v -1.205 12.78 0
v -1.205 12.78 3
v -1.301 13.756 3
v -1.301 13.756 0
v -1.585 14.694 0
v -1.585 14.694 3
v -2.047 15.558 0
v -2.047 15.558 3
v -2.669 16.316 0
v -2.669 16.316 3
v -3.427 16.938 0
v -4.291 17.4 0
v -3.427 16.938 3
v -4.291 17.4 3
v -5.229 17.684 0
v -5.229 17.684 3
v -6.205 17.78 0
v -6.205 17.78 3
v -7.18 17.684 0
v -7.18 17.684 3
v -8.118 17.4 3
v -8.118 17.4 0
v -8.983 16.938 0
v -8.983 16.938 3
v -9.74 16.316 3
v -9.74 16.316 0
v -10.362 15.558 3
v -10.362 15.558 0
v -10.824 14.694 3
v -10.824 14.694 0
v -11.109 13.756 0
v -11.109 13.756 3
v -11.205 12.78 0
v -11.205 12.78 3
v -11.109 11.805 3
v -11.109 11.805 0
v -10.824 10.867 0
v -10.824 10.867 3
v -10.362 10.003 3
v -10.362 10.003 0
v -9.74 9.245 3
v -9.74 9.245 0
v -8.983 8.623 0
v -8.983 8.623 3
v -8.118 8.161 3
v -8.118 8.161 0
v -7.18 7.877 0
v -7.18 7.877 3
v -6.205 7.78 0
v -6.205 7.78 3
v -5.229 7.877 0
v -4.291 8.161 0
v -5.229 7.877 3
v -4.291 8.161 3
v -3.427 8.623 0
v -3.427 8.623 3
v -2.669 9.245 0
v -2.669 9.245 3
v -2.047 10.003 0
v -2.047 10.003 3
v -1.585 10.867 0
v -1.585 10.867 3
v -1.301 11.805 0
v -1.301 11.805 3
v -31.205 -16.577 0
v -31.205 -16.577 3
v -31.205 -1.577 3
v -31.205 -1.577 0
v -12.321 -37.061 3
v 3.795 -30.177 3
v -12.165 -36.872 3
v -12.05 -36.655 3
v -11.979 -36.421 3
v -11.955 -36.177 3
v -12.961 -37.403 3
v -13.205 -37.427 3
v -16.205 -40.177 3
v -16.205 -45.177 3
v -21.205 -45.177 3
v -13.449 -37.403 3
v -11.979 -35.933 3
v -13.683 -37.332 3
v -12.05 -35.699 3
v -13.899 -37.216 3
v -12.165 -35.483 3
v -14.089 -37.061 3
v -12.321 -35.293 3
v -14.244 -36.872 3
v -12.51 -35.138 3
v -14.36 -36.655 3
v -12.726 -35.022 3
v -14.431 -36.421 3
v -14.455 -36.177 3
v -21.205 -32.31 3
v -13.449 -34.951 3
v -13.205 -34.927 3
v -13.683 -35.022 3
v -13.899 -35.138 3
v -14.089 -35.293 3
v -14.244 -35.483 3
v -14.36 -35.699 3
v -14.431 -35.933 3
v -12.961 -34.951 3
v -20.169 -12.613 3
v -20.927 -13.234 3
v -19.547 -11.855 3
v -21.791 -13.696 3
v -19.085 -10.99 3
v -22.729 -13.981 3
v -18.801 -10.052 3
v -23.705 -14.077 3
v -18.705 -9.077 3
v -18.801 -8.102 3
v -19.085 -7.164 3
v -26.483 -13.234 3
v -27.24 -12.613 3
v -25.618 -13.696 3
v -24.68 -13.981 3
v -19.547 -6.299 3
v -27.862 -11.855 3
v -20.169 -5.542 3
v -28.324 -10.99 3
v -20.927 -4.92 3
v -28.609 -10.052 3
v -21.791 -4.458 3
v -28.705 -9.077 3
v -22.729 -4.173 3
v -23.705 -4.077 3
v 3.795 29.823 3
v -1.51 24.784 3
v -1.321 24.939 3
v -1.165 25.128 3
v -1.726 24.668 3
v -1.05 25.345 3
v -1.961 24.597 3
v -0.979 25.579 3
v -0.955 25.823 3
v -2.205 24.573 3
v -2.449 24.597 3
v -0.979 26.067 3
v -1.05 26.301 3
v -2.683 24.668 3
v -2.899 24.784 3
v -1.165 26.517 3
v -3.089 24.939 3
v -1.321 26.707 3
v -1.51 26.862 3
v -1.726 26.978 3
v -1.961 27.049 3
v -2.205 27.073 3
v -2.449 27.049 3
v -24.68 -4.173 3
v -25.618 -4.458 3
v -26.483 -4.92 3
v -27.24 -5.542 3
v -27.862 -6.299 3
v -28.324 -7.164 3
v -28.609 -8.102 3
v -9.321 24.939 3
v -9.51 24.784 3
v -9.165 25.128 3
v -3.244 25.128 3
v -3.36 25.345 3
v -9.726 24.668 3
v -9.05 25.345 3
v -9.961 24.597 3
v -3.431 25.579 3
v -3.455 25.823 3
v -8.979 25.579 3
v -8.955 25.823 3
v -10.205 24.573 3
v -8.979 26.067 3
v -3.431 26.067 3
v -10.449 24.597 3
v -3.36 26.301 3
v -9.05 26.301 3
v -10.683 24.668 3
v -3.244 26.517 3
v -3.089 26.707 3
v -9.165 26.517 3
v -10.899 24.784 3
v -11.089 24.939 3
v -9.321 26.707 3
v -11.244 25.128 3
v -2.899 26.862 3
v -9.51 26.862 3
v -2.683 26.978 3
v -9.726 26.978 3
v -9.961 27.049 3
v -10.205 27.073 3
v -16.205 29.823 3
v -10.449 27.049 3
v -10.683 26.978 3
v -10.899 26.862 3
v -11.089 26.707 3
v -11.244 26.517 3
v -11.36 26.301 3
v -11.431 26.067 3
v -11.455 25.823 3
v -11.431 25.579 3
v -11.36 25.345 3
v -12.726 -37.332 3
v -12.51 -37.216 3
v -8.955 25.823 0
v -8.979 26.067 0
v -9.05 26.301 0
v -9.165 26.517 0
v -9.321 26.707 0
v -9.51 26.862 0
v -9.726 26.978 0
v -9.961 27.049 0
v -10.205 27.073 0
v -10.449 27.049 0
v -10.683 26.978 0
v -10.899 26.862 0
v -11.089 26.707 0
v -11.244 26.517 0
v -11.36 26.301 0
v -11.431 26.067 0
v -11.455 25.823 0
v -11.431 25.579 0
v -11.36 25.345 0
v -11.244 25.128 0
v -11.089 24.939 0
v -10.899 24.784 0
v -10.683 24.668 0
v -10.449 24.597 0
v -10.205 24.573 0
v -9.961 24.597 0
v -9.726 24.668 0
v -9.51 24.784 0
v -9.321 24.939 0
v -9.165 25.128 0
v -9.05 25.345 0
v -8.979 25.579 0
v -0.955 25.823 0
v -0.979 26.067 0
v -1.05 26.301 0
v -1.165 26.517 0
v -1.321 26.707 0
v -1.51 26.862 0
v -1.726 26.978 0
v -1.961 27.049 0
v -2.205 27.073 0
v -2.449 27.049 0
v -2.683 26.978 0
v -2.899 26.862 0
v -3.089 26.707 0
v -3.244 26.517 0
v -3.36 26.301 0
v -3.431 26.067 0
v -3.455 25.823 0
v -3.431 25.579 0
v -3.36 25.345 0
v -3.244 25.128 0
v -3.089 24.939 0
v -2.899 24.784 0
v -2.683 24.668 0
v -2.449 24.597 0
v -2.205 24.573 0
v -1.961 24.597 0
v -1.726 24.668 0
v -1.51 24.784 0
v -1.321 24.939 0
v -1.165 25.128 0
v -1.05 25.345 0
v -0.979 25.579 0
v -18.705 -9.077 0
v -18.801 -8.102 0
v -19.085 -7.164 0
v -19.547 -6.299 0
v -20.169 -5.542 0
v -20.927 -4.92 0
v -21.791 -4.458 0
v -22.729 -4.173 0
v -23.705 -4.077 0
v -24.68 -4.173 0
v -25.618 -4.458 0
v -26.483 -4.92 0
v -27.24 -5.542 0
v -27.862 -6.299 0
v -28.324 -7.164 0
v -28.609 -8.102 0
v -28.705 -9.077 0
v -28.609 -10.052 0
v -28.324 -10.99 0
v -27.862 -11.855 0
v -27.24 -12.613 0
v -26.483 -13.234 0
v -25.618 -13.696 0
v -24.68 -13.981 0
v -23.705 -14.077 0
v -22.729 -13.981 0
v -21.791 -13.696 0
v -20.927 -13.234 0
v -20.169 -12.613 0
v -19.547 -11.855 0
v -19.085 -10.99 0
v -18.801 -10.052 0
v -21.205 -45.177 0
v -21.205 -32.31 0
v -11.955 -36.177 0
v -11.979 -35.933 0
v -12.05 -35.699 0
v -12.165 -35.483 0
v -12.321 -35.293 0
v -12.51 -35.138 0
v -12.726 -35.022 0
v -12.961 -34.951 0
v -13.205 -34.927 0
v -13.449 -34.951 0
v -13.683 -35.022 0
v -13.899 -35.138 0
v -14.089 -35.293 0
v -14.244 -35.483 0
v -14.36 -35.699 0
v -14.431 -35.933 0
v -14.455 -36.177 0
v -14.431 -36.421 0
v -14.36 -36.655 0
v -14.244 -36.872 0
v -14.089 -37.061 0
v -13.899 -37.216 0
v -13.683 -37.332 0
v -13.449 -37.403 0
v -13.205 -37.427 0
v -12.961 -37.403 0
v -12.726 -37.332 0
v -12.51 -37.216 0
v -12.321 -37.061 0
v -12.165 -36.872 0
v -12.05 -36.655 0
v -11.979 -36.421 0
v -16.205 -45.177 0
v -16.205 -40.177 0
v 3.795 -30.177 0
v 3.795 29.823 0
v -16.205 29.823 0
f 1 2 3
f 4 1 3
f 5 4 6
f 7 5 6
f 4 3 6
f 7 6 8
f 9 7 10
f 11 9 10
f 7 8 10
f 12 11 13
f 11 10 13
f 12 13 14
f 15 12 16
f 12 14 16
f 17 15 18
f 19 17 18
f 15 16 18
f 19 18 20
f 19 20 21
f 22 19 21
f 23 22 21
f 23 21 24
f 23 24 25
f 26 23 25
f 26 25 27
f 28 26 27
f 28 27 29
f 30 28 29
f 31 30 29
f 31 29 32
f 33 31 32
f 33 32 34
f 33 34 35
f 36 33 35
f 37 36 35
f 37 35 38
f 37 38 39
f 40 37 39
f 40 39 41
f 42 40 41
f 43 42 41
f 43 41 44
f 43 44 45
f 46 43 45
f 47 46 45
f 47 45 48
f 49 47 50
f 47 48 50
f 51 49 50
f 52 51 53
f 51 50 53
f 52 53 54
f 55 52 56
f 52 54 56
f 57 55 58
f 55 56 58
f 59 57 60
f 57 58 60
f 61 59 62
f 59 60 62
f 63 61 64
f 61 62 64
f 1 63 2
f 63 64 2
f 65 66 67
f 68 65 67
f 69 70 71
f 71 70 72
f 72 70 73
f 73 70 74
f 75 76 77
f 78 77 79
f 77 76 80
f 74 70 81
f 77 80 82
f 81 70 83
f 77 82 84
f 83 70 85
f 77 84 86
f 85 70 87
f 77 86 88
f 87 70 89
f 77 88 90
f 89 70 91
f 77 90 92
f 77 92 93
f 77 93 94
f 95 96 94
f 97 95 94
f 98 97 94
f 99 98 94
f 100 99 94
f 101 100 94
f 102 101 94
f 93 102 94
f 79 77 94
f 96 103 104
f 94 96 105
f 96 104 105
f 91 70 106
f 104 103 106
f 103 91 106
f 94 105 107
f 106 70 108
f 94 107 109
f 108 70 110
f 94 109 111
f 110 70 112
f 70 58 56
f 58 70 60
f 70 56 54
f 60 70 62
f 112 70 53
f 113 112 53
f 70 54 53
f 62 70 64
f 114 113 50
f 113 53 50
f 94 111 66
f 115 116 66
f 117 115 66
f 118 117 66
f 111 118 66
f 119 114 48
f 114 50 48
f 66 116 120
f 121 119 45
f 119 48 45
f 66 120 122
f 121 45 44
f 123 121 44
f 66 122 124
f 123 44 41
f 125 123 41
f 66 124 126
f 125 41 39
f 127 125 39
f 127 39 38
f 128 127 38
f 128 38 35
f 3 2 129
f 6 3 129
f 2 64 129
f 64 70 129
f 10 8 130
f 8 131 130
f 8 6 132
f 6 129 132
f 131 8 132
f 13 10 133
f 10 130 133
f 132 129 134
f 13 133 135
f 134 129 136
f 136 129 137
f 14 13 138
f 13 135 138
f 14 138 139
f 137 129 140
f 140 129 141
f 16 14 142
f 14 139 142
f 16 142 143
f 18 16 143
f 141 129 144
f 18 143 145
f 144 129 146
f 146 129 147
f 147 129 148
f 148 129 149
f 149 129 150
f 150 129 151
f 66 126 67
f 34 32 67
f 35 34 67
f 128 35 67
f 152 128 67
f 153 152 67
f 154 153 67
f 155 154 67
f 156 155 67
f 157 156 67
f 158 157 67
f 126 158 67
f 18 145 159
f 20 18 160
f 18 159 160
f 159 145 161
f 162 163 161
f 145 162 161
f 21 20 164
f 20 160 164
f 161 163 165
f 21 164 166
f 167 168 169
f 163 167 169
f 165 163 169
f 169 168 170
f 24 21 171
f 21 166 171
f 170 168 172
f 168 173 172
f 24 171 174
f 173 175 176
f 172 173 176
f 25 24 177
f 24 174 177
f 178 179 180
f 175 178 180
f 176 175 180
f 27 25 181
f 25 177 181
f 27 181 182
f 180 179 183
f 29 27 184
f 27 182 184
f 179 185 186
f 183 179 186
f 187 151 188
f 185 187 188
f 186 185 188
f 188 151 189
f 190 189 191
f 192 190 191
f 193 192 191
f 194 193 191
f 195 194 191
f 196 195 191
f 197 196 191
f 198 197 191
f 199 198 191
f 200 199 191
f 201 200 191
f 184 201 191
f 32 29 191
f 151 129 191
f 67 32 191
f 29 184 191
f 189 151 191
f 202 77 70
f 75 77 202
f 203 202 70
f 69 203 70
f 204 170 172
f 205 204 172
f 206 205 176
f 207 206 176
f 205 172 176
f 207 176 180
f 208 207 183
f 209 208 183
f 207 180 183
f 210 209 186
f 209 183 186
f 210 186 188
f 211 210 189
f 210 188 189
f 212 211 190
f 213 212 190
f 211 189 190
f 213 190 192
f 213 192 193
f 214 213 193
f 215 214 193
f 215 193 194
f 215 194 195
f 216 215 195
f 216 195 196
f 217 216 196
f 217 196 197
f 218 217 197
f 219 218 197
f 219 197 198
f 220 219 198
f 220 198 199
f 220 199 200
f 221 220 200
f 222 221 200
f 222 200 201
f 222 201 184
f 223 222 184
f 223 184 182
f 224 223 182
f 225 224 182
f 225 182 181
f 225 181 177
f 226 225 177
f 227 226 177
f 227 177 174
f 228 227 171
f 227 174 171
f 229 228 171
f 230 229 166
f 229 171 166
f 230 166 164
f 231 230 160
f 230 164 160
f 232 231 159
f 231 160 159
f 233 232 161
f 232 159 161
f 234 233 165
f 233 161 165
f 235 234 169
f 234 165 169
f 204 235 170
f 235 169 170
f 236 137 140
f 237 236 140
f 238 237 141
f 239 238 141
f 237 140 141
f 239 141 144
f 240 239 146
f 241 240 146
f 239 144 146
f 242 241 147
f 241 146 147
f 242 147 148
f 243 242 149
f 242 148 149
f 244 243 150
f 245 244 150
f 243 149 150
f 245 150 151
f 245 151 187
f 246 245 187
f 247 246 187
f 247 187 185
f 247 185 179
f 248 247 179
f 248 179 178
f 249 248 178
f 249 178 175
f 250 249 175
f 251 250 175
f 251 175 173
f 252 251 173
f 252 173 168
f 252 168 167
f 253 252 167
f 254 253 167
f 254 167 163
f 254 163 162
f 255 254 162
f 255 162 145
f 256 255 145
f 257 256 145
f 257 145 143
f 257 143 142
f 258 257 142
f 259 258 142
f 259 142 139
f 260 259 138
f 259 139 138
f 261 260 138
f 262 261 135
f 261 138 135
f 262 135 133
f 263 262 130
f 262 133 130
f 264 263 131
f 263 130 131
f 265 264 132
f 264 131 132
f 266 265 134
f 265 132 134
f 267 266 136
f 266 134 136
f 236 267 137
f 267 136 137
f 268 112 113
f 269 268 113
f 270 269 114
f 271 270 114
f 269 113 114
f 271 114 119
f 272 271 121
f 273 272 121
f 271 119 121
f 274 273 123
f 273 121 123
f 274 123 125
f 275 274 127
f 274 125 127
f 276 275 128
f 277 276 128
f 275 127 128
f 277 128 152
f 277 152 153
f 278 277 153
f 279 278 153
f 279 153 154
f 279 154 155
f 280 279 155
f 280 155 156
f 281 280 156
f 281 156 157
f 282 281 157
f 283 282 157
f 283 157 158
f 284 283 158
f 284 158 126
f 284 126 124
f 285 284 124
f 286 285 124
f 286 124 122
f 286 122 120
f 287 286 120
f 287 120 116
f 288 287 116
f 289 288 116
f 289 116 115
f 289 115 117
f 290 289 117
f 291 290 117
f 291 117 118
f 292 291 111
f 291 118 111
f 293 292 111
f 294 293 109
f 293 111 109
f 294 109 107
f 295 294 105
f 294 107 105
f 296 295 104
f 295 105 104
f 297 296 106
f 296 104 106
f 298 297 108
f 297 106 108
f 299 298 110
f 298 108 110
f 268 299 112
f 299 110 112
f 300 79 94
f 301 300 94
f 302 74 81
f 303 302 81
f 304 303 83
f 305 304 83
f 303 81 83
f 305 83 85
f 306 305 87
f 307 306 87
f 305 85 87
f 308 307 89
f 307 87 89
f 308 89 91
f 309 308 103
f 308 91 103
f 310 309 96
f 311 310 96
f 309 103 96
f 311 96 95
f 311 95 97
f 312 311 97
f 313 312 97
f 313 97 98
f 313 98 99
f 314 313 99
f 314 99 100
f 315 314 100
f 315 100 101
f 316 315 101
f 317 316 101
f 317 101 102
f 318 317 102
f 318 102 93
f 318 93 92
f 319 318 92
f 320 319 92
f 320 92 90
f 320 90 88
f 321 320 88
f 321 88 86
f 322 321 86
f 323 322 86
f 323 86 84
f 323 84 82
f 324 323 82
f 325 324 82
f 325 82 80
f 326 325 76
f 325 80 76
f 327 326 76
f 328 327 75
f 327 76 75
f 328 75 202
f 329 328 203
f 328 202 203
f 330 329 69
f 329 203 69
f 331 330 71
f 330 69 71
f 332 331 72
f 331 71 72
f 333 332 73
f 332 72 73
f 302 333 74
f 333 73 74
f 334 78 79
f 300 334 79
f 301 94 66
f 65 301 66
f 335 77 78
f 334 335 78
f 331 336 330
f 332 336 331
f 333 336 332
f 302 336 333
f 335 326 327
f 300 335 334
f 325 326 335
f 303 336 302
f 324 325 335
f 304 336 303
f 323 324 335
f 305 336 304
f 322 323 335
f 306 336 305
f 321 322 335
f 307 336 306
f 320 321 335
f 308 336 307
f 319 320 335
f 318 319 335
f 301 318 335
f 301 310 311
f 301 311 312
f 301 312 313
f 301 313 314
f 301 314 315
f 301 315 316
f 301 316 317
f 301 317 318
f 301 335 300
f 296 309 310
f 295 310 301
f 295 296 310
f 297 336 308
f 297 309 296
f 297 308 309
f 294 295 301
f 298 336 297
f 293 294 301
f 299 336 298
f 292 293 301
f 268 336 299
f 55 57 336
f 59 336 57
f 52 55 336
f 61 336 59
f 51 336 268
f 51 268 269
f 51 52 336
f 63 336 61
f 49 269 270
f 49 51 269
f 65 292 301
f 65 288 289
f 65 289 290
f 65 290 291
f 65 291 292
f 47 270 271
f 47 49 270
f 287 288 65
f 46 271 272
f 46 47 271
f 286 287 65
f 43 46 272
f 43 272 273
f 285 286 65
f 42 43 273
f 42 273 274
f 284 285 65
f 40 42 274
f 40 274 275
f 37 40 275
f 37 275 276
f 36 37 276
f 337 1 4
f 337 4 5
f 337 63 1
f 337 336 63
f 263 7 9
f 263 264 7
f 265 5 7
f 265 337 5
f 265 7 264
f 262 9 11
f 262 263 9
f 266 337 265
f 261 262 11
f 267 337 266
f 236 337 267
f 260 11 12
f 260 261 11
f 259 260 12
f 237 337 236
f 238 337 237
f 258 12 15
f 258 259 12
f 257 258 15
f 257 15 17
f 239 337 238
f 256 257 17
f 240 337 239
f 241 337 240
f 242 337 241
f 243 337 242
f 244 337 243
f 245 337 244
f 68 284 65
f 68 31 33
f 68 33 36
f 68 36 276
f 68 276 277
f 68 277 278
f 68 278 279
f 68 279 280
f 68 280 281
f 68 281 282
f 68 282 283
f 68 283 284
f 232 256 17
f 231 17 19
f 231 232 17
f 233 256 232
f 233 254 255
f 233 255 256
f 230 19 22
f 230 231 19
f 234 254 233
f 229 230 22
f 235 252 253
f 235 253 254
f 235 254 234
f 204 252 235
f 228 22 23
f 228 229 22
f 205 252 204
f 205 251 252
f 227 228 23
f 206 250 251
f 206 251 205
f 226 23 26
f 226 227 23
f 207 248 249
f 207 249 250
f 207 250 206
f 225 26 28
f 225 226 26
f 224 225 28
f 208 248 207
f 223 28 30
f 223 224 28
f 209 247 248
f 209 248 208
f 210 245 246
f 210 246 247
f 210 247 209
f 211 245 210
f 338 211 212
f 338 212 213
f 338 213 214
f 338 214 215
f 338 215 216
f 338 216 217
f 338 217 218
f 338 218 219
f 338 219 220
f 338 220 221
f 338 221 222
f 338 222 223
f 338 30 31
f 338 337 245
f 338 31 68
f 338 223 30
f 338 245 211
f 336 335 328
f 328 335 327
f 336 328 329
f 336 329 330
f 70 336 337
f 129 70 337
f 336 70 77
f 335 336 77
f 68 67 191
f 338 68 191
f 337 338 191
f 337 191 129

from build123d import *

# Parameters (mm, degrees)
SKETCH1_W           = 20
SKETCH1_H           = 70
BOSS_EXTRUDE1_DEPTH = 3
SKETCH2_W           = 15
SKETCH2_H           = 15
BOSS_EXTRUDE2_DEPTH = 3
BOSS_EXTRUDE3_DEPTH = 3
BOSS_EXTRUDE4_DEPTH = 3
SKETCH7_R           = 5
SKETCH7_R_2         = 1.25
CUT_EXTRUDE1_DEPTH  = 4


with BuildPart() as part:
    # Sketch1 → Boss-Extrude1 (new body)
    with BuildSketch(Plane.XY):
        with Locations((-6.20477445, -5.177042891)):
            Rectangle(SKETCH1_W, SKETCH1_H)
    extrude(amount=BOSS_EXTRUDE1_DEPTH)

    # Sketch2 → Boss-Extrude2 (add)
    with BuildSketch(Plane.XY.offset(3)):
        with Locations((-23.70477445, -9.077042891)):
            Rectangle(SKETCH2_W, SKETCH2_H)
    extrude(amount=-BOSS_EXTRUDE2_DEPTH)

    # Sketch3 → Boss-Extrude3 (add)
    with BuildSketch(Plane.XY.offset(3)):
        Polygon((-31.20477445, -1.577042891), (-16.20477445, 29.822957109), (-16.20477445, -1.577042891), align=None)
        Polygon((-31.20477445, -16.577042891), (-16.20477445, -16.577042891), (-16.20477445, -40.177042891), align=None)
    extrude(amount=-BOSS_EXTRUDE3_DEPTH)

    # Sketch6 → Boss-Extrude4 (add)
    with BuildSketch(Plane.XY.offset(3)):
        Polygon((-16.20477445, -40.177042891), (-16.20477445, -45.177042891), (-21.20477445, -45.177042891), (-21.20477445, -32.310376225), align=None)
    extrude(amount=-BOSS_EXTRUDE4_DEPTH)

    # Sketch7 → Cut-Extrude1 (cut, through all)
    with BuildSketch(Plane.XY.offset(3)):
        with Locations((-23.70477445, -9.077042891)):
            Circle(SKETCH7_R)
        with Locations((-13.20477445, -36.177042891)):
            Circle(SKETCH7_R_2)
        with Locations((-6.20477445, 12.780450103)):
            Circle(SKETCH7_R)
        with Locations((-10.20477445, 25.822957109)):
            Circle(SKETCH7_R_2)
        with Locations((-2.20477445, 25.822957109)):
            Circle(SKETCH7_R_2)
        Polygon((3.79522555, -40.177042891), (3.79522555, -30.177042891), (-16.20477445, -40.177042891), align=None)
    extrude(amount=-CUT_EXTRUDE1_DEPTH, mode=Mode.SUBTRACT)


solid = part.part
